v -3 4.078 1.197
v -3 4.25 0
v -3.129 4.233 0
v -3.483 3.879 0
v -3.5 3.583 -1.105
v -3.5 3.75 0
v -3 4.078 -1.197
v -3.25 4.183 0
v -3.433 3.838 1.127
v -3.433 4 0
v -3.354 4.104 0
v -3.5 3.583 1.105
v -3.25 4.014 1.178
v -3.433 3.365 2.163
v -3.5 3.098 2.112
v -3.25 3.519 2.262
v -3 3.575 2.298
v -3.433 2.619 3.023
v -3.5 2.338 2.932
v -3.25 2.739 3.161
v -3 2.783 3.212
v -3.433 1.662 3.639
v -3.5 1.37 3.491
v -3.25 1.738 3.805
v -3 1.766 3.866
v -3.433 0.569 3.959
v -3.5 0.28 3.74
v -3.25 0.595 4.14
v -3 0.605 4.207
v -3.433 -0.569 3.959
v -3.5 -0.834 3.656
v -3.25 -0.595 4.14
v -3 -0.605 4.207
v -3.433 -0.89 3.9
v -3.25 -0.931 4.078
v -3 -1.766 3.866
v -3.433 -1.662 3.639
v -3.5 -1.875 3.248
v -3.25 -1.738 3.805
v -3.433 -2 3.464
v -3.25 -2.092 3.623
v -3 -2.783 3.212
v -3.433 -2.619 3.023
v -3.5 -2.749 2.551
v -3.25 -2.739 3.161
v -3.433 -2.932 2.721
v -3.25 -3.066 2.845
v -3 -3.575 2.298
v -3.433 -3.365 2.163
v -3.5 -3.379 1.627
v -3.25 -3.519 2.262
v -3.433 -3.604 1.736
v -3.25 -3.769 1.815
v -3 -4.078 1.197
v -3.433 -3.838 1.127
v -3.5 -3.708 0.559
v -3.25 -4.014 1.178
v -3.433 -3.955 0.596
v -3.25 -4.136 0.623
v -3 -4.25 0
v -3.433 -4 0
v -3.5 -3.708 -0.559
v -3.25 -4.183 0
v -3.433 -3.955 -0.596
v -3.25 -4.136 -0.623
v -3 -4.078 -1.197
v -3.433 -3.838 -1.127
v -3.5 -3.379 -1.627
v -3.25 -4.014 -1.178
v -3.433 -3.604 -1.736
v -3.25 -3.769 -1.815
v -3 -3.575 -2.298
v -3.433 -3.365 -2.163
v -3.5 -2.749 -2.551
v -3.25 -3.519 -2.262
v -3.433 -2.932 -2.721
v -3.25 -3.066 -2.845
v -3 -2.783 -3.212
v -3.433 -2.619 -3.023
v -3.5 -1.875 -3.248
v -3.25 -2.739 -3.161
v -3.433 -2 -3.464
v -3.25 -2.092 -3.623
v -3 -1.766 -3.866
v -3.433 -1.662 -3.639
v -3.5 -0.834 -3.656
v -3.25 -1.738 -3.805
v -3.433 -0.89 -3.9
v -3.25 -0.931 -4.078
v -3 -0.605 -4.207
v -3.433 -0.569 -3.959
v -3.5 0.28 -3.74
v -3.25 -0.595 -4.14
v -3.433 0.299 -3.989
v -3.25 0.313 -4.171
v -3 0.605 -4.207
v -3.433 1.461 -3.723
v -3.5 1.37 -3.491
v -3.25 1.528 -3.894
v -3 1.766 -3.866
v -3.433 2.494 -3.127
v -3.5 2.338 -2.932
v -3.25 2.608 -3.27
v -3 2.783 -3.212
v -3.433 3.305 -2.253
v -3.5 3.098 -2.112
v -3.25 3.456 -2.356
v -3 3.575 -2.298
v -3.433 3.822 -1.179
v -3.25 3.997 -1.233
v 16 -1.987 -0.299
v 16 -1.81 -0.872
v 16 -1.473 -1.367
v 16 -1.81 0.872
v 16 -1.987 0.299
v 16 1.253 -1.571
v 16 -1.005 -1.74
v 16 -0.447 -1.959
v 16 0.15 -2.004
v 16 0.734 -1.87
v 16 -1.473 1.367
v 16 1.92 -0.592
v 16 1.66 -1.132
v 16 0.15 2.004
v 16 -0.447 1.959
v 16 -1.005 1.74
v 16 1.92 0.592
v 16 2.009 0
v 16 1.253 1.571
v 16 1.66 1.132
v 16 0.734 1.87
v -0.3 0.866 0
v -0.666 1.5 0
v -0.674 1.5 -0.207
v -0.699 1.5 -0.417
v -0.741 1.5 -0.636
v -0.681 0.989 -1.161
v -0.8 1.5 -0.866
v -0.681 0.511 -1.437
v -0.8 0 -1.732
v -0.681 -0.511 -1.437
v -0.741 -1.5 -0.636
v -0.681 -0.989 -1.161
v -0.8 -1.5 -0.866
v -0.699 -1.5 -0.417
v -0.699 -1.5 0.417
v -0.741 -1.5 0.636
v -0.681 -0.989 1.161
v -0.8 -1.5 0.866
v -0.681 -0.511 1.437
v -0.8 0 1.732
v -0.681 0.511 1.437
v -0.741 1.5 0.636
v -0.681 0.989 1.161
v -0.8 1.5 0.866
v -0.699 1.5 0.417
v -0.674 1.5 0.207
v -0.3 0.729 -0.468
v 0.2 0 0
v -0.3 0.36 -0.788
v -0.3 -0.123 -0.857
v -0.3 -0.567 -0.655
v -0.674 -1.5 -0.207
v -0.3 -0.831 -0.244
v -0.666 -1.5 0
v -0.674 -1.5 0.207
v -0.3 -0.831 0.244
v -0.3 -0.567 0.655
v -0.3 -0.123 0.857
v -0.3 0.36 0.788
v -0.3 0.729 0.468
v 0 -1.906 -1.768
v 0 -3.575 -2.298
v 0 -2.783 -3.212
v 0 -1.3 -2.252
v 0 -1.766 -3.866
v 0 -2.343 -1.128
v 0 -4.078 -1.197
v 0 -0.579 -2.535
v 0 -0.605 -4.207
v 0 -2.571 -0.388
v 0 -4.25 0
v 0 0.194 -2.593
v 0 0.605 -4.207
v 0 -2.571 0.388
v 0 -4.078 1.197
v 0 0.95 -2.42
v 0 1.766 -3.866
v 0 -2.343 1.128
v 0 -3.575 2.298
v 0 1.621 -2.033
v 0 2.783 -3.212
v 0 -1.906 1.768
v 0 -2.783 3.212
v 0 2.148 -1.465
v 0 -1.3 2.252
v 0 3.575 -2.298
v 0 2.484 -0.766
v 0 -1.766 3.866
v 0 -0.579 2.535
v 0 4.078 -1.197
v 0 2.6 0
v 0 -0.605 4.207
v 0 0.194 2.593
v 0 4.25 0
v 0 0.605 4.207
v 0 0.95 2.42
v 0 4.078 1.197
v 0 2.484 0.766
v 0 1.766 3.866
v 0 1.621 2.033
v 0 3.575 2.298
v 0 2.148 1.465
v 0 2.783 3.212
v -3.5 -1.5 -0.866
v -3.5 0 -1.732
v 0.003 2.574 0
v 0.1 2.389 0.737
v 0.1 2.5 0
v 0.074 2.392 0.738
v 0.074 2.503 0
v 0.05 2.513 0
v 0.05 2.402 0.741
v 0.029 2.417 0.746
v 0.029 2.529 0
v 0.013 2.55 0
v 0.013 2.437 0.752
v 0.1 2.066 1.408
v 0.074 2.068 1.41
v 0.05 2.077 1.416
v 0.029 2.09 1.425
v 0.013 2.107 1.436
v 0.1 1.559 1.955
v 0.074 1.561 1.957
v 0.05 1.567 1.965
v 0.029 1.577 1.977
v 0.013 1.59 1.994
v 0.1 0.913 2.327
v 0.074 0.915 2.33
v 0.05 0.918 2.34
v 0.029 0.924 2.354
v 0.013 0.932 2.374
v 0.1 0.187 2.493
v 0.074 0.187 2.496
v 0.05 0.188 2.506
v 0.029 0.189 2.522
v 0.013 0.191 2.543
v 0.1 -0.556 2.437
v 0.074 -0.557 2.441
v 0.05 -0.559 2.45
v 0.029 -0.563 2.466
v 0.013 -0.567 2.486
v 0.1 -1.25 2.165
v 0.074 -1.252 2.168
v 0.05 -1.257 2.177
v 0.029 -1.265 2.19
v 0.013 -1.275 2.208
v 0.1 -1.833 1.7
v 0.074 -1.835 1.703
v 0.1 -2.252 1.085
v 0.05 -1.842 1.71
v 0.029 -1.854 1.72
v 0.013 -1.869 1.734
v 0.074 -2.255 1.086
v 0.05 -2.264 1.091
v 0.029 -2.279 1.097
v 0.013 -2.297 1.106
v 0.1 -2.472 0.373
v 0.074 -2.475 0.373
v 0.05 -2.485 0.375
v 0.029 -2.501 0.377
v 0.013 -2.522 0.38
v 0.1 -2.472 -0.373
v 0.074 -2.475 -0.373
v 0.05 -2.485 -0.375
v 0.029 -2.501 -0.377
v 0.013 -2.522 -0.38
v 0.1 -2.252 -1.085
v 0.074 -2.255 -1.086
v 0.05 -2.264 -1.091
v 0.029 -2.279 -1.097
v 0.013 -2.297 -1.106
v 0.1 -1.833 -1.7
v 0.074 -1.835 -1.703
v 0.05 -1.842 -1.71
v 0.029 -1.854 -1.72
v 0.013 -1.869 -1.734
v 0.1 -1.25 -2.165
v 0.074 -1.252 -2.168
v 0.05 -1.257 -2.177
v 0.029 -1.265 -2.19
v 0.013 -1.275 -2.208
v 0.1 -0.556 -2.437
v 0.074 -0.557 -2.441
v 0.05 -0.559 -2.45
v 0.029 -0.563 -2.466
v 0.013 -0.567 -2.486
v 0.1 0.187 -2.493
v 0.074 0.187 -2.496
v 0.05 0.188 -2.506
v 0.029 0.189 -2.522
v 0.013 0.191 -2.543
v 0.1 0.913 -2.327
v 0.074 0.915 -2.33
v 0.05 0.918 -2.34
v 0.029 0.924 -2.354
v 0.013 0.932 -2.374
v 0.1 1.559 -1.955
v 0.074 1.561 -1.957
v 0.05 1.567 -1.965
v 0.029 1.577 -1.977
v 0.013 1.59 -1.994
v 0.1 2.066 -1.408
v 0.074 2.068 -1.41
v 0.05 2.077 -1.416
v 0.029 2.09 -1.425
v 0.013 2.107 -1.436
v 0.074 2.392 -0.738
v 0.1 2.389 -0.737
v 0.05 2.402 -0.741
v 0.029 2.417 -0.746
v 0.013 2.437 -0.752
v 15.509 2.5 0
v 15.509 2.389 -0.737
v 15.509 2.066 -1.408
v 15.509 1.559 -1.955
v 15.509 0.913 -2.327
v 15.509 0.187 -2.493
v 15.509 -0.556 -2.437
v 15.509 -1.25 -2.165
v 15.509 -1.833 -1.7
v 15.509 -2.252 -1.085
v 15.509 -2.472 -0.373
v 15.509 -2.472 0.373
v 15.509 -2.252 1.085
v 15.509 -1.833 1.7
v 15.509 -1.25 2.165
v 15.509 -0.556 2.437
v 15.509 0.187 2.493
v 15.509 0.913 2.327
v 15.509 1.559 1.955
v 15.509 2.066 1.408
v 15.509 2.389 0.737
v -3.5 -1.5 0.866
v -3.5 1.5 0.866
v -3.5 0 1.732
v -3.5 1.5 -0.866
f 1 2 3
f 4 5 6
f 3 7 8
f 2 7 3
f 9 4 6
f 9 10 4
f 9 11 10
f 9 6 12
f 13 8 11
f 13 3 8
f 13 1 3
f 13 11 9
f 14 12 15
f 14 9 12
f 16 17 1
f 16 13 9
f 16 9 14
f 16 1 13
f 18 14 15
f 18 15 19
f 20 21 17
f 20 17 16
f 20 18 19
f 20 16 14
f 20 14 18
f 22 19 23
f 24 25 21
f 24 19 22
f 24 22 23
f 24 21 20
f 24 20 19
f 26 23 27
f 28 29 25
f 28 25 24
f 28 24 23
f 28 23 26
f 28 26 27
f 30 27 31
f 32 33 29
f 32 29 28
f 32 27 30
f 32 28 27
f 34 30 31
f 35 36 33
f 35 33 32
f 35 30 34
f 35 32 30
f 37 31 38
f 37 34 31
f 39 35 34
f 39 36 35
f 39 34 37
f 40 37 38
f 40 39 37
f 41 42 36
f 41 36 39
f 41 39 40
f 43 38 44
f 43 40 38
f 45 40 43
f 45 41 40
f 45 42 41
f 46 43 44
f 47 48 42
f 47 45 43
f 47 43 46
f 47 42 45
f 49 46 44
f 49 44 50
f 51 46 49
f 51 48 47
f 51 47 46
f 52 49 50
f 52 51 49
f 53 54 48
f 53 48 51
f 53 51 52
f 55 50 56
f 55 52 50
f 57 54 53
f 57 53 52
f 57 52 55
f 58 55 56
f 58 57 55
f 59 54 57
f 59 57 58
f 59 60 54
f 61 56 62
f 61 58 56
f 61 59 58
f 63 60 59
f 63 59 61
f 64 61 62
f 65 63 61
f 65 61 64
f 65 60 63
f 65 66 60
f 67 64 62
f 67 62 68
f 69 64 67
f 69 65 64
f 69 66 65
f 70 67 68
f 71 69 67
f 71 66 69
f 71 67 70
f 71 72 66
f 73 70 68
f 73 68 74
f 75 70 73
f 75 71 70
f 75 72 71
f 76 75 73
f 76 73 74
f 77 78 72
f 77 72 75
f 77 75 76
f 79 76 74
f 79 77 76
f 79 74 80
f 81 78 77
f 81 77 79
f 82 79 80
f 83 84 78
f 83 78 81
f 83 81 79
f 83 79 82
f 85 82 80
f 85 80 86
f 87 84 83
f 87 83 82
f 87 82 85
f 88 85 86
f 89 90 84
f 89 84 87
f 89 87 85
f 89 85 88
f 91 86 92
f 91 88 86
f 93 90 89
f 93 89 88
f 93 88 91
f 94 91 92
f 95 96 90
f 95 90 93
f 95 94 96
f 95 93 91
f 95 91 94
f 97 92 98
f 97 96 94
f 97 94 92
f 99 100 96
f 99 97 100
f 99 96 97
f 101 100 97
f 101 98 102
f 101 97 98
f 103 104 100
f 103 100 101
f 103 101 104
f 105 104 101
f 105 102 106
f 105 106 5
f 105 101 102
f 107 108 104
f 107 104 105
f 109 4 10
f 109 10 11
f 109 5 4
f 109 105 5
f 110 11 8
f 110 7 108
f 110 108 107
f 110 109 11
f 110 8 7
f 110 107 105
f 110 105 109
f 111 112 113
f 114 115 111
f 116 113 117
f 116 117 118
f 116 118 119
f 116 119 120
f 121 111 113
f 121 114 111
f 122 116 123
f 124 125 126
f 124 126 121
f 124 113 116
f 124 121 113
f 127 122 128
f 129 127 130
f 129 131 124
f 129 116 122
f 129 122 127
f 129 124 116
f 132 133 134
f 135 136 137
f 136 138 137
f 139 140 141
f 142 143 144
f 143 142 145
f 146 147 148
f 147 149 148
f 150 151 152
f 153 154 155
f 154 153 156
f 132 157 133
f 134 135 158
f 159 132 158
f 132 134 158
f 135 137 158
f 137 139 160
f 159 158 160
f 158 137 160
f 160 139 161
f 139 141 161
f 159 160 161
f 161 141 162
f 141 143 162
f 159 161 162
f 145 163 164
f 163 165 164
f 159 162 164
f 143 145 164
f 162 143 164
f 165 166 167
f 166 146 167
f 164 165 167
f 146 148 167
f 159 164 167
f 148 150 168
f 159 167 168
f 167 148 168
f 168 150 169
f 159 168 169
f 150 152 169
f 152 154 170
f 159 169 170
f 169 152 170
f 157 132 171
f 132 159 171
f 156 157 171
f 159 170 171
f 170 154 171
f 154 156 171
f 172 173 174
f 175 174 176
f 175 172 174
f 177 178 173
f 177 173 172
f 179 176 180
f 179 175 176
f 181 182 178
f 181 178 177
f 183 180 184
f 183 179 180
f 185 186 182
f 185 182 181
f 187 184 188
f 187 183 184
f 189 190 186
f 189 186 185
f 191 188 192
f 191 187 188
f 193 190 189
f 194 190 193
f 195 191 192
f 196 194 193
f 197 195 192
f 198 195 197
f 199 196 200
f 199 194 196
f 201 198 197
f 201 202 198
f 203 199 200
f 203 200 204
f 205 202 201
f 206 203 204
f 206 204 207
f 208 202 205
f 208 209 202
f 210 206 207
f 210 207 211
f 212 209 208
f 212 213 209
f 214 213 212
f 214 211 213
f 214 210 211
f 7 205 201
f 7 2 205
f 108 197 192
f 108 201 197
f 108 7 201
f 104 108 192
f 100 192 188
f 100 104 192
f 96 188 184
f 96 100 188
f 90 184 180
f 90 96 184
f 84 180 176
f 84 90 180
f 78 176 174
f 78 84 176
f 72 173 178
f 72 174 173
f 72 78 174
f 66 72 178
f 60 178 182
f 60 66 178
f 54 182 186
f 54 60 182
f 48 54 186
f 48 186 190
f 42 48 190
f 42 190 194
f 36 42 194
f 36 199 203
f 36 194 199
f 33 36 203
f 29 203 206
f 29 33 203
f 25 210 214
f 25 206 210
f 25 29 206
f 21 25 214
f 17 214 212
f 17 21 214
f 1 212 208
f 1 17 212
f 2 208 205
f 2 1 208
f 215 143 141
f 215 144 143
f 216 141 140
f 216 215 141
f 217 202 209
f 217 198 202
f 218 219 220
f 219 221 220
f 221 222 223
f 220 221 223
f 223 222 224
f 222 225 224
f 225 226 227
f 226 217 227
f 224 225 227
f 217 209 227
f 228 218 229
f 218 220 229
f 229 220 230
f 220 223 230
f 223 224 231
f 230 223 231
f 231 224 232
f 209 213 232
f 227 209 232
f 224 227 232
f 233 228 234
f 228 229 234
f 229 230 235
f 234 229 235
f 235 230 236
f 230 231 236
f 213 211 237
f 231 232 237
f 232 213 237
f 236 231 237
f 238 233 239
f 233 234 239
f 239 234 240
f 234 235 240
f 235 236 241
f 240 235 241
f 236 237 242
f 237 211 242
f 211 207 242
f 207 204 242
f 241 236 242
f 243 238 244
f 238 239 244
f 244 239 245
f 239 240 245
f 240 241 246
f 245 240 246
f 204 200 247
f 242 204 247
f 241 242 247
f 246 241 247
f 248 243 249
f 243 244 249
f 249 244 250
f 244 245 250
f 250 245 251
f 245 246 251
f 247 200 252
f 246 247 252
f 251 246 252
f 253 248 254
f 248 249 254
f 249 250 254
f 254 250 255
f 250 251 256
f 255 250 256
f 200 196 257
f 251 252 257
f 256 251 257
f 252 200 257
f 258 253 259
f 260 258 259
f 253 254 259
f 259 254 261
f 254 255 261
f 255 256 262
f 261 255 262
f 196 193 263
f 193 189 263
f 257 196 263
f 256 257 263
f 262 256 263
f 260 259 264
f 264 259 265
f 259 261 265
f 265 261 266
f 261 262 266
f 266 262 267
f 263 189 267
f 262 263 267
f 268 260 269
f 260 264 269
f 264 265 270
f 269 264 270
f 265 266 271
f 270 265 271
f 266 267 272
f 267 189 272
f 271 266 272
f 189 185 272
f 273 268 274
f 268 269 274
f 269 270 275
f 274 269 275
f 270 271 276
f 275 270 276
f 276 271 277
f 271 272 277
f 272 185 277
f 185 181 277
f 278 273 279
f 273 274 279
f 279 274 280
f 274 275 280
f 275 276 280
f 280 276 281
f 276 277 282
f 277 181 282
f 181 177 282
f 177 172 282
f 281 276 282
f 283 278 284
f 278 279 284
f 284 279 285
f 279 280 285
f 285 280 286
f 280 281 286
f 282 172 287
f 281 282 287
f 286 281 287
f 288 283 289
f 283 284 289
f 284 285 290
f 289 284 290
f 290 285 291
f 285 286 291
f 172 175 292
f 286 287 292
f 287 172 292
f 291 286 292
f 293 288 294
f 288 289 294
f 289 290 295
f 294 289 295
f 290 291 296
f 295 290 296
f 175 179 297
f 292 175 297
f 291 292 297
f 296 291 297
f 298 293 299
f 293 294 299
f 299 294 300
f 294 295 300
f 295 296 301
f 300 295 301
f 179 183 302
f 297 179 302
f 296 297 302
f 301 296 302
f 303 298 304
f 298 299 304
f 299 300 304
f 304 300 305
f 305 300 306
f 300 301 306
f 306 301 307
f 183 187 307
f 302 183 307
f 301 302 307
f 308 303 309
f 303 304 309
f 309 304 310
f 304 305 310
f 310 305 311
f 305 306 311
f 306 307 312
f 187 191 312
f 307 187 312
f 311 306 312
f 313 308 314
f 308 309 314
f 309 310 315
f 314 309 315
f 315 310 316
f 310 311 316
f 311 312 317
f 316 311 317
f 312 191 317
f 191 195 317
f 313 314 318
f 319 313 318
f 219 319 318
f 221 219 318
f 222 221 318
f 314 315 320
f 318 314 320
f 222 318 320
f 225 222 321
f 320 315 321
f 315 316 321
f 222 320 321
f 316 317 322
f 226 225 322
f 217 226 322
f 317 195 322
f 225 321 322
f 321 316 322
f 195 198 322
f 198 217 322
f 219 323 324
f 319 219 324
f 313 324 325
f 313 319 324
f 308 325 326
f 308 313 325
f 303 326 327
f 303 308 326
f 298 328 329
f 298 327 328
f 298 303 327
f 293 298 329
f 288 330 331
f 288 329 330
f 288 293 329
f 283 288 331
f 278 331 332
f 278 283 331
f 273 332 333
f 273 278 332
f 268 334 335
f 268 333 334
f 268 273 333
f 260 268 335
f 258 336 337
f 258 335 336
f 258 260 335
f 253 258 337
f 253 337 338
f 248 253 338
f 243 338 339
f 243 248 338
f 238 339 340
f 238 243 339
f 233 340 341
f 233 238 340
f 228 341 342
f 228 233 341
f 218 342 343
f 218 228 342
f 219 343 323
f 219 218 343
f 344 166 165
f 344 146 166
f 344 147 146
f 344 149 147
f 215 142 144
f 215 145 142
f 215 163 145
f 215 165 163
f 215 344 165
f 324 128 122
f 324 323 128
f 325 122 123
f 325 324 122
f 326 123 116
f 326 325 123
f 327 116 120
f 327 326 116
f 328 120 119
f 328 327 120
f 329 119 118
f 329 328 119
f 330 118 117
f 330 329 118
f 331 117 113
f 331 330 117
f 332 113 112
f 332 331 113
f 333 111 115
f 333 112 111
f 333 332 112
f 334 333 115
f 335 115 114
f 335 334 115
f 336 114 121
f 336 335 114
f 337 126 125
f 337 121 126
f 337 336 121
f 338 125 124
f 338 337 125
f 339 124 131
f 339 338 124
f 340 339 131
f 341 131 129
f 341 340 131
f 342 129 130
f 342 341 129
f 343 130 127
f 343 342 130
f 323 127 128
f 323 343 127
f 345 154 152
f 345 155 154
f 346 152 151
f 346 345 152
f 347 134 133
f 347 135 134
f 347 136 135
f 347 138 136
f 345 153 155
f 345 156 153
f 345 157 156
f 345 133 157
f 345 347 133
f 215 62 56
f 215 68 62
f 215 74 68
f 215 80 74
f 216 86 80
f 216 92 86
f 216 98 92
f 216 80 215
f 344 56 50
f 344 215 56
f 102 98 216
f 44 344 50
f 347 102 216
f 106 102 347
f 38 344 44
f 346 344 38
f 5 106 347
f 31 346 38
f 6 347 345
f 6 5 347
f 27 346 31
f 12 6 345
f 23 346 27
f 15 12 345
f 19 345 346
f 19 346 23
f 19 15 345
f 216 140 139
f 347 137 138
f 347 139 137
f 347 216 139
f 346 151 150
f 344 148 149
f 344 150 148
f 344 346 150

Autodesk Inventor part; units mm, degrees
ref_plane "YZ Plane" through (0, 0, 0) normal (1, 0, 0) x (0, 1, 0)
ref_plane "XZ Plane" through (0, 0, 0) normal (0, 1, 0) x (-1, 0, 0)
sketch "Sketch1" plane through (0, 0, 0) normal (0, 0, 1) x (1, 0, 0)
  line L0 (0.2, 0) -> (16, 0)
  line L1 (16, 0) -> (16, 2.5)
  line L2 (16, 2.5) -> (2.4, 2.5)
  line L3 (2.4, 2.5) -> (1.9091, 2.5)
  line L4 (1.9091, 2.5) -> (0, 2.5)
  line L5 (0, 2.5) -> (0, 4.25)
  line L6 (0, 4.25) -> (-3.5, 4.25)
  line L7 (-3.5, 4.25) -> (-3.5, 1.7321)
  line L8 (-3.5, 1.7321) -> (-0.8, 1.7321)
  line L9 (-0.8, 1.7321) -> (0.2, 0)
  line L10 (-7.4, 0) -> (19.9, 0) projected
  line L11 (0, -0.85) -> (0, 5.1) projected
  line L12 (2.4, 2.5) -> (0, 2.5) construction
  dimension "d1" = 13.6
  dimension "d2" = 0.4909
  dimension "d3" = 3.5
  dimension "d4" = 2.7
  dimension "d5" = 60
  dimension "d6" = 5
  dimension "d7" = 5
  dimension "d8" = 3.4641
  dimension "d9" = 8.5
  dimension "d26" = 16
revolve "Body" add sketch "Sketch1" angle 360 about axis through (0.2, 0, 0) along (1, 0, 0) contours L9 L11 L4 L3 L2 L1 L0 | L9 L8 L7 L6 L5 L11
sketch "Sketch2" plane through (-3.5, 0, 0) normal (-1, 0, 0) x (0, 0, 1)
  circle A0 centre (0, 0) radius 1.7321 projected
  line L0 (0, -5.95) -> (0, 5.95) projected
  line L1 (-5.95, 0) -> (5.95, 0) projected
  line L2 (1.7321, 0) -> (0.866, -1.5)
  line L3 (0.866, -1.5) -> (-0.866, -1.5)
  line L4 (-0.866, -1.5) -> (-1.7321, 0)
  line L5 (-1.7321, 0) -> (-0.866, 1.5)
  line L6 (-0.866, 1.5) -> (0.866, 1.5)
  line L7 (0.866, 1.5) -> (1.7321, 0)
extrude "Slot" add sketch "Sketch2" against normal up to next contours L7 A0 | A0 L2 | L6 L0 A0 | A0 L0 L3 | L0 L6 A0 | A0 L3 L0 | L4 A0 | A0 L5
fillet "Fillet1" radius 0.5 1 edges at (-3.5, -4.25, 0)
thread "Thread" size "M5x0.8" class "6g" standard "ISO Metric profile" length 13.6
chamfer "Chamfer1" distance 0.4908 distance2 0.4908 1 edges at (16, -2.5, 0) measured on face at (16, -1.1374, -1.1324)
ref_plane "Work Plane1" through (29, 0, 0) normal (0, -1, 0) x (1, 0, 0)
fillet "Fillet2" radius 0.1 1 edges at (0, -2.5, 0)
equation "\"d1\" = GEL"
equation "\"d3\" = KOH"
equation "\"d4\" = INTI"
equation "\"d6\" = GD"
equation "\"d7\" = BDM"
equation "\"d8\" = 1.1547 * SW"
equation "\"d9\" = KOD"
equation "\"d26\" = NLG"
equation "\"d30\" = R"
equation "\"d17\" = RR"
equation "\"d13\" = GEL"
equation "\"d15\" = -0.5 * SPD + 0.5 * GD"
equation "\"d16\" = GUL"
equation "\"GD\" = NND"
equation "\"NLG\" = 16"
equation "\"GEL\" = 13.6"
equation "\"KOD\" = 8.5"
equation "\"KOH\" = 3.5"
equation "\"INTI\" = 2.7"
equation "\"GAL\" = 0.61345 * PTC"
equation "\"GUL\" = 0.61345 * PTC"
equation "\"BDM\" = NND"
equation "\"SW\" = 3"
equation "\"RR\" = 0.5"
equation "\"SPD\" = NND - 1.2269 * PTC"
equation "\"R\" = 0.1"
equation "\"TOA\" = 30deg"
equation "\"GD1\" = THREADDIA - 1.2269 * PTC"
equation "\"THREADDIA\" = 5"
equation "\"FAWI\" = 45deg"
equation "\"ANG\" = 120deg"
equation "\"PTC\" = 0.8"
equation "\"NND\" = 5"
equation "\"E0\" = 1.155 * SW"
properties part number "DIN 7984 - M5 x 16" material "Steel, Mild"
